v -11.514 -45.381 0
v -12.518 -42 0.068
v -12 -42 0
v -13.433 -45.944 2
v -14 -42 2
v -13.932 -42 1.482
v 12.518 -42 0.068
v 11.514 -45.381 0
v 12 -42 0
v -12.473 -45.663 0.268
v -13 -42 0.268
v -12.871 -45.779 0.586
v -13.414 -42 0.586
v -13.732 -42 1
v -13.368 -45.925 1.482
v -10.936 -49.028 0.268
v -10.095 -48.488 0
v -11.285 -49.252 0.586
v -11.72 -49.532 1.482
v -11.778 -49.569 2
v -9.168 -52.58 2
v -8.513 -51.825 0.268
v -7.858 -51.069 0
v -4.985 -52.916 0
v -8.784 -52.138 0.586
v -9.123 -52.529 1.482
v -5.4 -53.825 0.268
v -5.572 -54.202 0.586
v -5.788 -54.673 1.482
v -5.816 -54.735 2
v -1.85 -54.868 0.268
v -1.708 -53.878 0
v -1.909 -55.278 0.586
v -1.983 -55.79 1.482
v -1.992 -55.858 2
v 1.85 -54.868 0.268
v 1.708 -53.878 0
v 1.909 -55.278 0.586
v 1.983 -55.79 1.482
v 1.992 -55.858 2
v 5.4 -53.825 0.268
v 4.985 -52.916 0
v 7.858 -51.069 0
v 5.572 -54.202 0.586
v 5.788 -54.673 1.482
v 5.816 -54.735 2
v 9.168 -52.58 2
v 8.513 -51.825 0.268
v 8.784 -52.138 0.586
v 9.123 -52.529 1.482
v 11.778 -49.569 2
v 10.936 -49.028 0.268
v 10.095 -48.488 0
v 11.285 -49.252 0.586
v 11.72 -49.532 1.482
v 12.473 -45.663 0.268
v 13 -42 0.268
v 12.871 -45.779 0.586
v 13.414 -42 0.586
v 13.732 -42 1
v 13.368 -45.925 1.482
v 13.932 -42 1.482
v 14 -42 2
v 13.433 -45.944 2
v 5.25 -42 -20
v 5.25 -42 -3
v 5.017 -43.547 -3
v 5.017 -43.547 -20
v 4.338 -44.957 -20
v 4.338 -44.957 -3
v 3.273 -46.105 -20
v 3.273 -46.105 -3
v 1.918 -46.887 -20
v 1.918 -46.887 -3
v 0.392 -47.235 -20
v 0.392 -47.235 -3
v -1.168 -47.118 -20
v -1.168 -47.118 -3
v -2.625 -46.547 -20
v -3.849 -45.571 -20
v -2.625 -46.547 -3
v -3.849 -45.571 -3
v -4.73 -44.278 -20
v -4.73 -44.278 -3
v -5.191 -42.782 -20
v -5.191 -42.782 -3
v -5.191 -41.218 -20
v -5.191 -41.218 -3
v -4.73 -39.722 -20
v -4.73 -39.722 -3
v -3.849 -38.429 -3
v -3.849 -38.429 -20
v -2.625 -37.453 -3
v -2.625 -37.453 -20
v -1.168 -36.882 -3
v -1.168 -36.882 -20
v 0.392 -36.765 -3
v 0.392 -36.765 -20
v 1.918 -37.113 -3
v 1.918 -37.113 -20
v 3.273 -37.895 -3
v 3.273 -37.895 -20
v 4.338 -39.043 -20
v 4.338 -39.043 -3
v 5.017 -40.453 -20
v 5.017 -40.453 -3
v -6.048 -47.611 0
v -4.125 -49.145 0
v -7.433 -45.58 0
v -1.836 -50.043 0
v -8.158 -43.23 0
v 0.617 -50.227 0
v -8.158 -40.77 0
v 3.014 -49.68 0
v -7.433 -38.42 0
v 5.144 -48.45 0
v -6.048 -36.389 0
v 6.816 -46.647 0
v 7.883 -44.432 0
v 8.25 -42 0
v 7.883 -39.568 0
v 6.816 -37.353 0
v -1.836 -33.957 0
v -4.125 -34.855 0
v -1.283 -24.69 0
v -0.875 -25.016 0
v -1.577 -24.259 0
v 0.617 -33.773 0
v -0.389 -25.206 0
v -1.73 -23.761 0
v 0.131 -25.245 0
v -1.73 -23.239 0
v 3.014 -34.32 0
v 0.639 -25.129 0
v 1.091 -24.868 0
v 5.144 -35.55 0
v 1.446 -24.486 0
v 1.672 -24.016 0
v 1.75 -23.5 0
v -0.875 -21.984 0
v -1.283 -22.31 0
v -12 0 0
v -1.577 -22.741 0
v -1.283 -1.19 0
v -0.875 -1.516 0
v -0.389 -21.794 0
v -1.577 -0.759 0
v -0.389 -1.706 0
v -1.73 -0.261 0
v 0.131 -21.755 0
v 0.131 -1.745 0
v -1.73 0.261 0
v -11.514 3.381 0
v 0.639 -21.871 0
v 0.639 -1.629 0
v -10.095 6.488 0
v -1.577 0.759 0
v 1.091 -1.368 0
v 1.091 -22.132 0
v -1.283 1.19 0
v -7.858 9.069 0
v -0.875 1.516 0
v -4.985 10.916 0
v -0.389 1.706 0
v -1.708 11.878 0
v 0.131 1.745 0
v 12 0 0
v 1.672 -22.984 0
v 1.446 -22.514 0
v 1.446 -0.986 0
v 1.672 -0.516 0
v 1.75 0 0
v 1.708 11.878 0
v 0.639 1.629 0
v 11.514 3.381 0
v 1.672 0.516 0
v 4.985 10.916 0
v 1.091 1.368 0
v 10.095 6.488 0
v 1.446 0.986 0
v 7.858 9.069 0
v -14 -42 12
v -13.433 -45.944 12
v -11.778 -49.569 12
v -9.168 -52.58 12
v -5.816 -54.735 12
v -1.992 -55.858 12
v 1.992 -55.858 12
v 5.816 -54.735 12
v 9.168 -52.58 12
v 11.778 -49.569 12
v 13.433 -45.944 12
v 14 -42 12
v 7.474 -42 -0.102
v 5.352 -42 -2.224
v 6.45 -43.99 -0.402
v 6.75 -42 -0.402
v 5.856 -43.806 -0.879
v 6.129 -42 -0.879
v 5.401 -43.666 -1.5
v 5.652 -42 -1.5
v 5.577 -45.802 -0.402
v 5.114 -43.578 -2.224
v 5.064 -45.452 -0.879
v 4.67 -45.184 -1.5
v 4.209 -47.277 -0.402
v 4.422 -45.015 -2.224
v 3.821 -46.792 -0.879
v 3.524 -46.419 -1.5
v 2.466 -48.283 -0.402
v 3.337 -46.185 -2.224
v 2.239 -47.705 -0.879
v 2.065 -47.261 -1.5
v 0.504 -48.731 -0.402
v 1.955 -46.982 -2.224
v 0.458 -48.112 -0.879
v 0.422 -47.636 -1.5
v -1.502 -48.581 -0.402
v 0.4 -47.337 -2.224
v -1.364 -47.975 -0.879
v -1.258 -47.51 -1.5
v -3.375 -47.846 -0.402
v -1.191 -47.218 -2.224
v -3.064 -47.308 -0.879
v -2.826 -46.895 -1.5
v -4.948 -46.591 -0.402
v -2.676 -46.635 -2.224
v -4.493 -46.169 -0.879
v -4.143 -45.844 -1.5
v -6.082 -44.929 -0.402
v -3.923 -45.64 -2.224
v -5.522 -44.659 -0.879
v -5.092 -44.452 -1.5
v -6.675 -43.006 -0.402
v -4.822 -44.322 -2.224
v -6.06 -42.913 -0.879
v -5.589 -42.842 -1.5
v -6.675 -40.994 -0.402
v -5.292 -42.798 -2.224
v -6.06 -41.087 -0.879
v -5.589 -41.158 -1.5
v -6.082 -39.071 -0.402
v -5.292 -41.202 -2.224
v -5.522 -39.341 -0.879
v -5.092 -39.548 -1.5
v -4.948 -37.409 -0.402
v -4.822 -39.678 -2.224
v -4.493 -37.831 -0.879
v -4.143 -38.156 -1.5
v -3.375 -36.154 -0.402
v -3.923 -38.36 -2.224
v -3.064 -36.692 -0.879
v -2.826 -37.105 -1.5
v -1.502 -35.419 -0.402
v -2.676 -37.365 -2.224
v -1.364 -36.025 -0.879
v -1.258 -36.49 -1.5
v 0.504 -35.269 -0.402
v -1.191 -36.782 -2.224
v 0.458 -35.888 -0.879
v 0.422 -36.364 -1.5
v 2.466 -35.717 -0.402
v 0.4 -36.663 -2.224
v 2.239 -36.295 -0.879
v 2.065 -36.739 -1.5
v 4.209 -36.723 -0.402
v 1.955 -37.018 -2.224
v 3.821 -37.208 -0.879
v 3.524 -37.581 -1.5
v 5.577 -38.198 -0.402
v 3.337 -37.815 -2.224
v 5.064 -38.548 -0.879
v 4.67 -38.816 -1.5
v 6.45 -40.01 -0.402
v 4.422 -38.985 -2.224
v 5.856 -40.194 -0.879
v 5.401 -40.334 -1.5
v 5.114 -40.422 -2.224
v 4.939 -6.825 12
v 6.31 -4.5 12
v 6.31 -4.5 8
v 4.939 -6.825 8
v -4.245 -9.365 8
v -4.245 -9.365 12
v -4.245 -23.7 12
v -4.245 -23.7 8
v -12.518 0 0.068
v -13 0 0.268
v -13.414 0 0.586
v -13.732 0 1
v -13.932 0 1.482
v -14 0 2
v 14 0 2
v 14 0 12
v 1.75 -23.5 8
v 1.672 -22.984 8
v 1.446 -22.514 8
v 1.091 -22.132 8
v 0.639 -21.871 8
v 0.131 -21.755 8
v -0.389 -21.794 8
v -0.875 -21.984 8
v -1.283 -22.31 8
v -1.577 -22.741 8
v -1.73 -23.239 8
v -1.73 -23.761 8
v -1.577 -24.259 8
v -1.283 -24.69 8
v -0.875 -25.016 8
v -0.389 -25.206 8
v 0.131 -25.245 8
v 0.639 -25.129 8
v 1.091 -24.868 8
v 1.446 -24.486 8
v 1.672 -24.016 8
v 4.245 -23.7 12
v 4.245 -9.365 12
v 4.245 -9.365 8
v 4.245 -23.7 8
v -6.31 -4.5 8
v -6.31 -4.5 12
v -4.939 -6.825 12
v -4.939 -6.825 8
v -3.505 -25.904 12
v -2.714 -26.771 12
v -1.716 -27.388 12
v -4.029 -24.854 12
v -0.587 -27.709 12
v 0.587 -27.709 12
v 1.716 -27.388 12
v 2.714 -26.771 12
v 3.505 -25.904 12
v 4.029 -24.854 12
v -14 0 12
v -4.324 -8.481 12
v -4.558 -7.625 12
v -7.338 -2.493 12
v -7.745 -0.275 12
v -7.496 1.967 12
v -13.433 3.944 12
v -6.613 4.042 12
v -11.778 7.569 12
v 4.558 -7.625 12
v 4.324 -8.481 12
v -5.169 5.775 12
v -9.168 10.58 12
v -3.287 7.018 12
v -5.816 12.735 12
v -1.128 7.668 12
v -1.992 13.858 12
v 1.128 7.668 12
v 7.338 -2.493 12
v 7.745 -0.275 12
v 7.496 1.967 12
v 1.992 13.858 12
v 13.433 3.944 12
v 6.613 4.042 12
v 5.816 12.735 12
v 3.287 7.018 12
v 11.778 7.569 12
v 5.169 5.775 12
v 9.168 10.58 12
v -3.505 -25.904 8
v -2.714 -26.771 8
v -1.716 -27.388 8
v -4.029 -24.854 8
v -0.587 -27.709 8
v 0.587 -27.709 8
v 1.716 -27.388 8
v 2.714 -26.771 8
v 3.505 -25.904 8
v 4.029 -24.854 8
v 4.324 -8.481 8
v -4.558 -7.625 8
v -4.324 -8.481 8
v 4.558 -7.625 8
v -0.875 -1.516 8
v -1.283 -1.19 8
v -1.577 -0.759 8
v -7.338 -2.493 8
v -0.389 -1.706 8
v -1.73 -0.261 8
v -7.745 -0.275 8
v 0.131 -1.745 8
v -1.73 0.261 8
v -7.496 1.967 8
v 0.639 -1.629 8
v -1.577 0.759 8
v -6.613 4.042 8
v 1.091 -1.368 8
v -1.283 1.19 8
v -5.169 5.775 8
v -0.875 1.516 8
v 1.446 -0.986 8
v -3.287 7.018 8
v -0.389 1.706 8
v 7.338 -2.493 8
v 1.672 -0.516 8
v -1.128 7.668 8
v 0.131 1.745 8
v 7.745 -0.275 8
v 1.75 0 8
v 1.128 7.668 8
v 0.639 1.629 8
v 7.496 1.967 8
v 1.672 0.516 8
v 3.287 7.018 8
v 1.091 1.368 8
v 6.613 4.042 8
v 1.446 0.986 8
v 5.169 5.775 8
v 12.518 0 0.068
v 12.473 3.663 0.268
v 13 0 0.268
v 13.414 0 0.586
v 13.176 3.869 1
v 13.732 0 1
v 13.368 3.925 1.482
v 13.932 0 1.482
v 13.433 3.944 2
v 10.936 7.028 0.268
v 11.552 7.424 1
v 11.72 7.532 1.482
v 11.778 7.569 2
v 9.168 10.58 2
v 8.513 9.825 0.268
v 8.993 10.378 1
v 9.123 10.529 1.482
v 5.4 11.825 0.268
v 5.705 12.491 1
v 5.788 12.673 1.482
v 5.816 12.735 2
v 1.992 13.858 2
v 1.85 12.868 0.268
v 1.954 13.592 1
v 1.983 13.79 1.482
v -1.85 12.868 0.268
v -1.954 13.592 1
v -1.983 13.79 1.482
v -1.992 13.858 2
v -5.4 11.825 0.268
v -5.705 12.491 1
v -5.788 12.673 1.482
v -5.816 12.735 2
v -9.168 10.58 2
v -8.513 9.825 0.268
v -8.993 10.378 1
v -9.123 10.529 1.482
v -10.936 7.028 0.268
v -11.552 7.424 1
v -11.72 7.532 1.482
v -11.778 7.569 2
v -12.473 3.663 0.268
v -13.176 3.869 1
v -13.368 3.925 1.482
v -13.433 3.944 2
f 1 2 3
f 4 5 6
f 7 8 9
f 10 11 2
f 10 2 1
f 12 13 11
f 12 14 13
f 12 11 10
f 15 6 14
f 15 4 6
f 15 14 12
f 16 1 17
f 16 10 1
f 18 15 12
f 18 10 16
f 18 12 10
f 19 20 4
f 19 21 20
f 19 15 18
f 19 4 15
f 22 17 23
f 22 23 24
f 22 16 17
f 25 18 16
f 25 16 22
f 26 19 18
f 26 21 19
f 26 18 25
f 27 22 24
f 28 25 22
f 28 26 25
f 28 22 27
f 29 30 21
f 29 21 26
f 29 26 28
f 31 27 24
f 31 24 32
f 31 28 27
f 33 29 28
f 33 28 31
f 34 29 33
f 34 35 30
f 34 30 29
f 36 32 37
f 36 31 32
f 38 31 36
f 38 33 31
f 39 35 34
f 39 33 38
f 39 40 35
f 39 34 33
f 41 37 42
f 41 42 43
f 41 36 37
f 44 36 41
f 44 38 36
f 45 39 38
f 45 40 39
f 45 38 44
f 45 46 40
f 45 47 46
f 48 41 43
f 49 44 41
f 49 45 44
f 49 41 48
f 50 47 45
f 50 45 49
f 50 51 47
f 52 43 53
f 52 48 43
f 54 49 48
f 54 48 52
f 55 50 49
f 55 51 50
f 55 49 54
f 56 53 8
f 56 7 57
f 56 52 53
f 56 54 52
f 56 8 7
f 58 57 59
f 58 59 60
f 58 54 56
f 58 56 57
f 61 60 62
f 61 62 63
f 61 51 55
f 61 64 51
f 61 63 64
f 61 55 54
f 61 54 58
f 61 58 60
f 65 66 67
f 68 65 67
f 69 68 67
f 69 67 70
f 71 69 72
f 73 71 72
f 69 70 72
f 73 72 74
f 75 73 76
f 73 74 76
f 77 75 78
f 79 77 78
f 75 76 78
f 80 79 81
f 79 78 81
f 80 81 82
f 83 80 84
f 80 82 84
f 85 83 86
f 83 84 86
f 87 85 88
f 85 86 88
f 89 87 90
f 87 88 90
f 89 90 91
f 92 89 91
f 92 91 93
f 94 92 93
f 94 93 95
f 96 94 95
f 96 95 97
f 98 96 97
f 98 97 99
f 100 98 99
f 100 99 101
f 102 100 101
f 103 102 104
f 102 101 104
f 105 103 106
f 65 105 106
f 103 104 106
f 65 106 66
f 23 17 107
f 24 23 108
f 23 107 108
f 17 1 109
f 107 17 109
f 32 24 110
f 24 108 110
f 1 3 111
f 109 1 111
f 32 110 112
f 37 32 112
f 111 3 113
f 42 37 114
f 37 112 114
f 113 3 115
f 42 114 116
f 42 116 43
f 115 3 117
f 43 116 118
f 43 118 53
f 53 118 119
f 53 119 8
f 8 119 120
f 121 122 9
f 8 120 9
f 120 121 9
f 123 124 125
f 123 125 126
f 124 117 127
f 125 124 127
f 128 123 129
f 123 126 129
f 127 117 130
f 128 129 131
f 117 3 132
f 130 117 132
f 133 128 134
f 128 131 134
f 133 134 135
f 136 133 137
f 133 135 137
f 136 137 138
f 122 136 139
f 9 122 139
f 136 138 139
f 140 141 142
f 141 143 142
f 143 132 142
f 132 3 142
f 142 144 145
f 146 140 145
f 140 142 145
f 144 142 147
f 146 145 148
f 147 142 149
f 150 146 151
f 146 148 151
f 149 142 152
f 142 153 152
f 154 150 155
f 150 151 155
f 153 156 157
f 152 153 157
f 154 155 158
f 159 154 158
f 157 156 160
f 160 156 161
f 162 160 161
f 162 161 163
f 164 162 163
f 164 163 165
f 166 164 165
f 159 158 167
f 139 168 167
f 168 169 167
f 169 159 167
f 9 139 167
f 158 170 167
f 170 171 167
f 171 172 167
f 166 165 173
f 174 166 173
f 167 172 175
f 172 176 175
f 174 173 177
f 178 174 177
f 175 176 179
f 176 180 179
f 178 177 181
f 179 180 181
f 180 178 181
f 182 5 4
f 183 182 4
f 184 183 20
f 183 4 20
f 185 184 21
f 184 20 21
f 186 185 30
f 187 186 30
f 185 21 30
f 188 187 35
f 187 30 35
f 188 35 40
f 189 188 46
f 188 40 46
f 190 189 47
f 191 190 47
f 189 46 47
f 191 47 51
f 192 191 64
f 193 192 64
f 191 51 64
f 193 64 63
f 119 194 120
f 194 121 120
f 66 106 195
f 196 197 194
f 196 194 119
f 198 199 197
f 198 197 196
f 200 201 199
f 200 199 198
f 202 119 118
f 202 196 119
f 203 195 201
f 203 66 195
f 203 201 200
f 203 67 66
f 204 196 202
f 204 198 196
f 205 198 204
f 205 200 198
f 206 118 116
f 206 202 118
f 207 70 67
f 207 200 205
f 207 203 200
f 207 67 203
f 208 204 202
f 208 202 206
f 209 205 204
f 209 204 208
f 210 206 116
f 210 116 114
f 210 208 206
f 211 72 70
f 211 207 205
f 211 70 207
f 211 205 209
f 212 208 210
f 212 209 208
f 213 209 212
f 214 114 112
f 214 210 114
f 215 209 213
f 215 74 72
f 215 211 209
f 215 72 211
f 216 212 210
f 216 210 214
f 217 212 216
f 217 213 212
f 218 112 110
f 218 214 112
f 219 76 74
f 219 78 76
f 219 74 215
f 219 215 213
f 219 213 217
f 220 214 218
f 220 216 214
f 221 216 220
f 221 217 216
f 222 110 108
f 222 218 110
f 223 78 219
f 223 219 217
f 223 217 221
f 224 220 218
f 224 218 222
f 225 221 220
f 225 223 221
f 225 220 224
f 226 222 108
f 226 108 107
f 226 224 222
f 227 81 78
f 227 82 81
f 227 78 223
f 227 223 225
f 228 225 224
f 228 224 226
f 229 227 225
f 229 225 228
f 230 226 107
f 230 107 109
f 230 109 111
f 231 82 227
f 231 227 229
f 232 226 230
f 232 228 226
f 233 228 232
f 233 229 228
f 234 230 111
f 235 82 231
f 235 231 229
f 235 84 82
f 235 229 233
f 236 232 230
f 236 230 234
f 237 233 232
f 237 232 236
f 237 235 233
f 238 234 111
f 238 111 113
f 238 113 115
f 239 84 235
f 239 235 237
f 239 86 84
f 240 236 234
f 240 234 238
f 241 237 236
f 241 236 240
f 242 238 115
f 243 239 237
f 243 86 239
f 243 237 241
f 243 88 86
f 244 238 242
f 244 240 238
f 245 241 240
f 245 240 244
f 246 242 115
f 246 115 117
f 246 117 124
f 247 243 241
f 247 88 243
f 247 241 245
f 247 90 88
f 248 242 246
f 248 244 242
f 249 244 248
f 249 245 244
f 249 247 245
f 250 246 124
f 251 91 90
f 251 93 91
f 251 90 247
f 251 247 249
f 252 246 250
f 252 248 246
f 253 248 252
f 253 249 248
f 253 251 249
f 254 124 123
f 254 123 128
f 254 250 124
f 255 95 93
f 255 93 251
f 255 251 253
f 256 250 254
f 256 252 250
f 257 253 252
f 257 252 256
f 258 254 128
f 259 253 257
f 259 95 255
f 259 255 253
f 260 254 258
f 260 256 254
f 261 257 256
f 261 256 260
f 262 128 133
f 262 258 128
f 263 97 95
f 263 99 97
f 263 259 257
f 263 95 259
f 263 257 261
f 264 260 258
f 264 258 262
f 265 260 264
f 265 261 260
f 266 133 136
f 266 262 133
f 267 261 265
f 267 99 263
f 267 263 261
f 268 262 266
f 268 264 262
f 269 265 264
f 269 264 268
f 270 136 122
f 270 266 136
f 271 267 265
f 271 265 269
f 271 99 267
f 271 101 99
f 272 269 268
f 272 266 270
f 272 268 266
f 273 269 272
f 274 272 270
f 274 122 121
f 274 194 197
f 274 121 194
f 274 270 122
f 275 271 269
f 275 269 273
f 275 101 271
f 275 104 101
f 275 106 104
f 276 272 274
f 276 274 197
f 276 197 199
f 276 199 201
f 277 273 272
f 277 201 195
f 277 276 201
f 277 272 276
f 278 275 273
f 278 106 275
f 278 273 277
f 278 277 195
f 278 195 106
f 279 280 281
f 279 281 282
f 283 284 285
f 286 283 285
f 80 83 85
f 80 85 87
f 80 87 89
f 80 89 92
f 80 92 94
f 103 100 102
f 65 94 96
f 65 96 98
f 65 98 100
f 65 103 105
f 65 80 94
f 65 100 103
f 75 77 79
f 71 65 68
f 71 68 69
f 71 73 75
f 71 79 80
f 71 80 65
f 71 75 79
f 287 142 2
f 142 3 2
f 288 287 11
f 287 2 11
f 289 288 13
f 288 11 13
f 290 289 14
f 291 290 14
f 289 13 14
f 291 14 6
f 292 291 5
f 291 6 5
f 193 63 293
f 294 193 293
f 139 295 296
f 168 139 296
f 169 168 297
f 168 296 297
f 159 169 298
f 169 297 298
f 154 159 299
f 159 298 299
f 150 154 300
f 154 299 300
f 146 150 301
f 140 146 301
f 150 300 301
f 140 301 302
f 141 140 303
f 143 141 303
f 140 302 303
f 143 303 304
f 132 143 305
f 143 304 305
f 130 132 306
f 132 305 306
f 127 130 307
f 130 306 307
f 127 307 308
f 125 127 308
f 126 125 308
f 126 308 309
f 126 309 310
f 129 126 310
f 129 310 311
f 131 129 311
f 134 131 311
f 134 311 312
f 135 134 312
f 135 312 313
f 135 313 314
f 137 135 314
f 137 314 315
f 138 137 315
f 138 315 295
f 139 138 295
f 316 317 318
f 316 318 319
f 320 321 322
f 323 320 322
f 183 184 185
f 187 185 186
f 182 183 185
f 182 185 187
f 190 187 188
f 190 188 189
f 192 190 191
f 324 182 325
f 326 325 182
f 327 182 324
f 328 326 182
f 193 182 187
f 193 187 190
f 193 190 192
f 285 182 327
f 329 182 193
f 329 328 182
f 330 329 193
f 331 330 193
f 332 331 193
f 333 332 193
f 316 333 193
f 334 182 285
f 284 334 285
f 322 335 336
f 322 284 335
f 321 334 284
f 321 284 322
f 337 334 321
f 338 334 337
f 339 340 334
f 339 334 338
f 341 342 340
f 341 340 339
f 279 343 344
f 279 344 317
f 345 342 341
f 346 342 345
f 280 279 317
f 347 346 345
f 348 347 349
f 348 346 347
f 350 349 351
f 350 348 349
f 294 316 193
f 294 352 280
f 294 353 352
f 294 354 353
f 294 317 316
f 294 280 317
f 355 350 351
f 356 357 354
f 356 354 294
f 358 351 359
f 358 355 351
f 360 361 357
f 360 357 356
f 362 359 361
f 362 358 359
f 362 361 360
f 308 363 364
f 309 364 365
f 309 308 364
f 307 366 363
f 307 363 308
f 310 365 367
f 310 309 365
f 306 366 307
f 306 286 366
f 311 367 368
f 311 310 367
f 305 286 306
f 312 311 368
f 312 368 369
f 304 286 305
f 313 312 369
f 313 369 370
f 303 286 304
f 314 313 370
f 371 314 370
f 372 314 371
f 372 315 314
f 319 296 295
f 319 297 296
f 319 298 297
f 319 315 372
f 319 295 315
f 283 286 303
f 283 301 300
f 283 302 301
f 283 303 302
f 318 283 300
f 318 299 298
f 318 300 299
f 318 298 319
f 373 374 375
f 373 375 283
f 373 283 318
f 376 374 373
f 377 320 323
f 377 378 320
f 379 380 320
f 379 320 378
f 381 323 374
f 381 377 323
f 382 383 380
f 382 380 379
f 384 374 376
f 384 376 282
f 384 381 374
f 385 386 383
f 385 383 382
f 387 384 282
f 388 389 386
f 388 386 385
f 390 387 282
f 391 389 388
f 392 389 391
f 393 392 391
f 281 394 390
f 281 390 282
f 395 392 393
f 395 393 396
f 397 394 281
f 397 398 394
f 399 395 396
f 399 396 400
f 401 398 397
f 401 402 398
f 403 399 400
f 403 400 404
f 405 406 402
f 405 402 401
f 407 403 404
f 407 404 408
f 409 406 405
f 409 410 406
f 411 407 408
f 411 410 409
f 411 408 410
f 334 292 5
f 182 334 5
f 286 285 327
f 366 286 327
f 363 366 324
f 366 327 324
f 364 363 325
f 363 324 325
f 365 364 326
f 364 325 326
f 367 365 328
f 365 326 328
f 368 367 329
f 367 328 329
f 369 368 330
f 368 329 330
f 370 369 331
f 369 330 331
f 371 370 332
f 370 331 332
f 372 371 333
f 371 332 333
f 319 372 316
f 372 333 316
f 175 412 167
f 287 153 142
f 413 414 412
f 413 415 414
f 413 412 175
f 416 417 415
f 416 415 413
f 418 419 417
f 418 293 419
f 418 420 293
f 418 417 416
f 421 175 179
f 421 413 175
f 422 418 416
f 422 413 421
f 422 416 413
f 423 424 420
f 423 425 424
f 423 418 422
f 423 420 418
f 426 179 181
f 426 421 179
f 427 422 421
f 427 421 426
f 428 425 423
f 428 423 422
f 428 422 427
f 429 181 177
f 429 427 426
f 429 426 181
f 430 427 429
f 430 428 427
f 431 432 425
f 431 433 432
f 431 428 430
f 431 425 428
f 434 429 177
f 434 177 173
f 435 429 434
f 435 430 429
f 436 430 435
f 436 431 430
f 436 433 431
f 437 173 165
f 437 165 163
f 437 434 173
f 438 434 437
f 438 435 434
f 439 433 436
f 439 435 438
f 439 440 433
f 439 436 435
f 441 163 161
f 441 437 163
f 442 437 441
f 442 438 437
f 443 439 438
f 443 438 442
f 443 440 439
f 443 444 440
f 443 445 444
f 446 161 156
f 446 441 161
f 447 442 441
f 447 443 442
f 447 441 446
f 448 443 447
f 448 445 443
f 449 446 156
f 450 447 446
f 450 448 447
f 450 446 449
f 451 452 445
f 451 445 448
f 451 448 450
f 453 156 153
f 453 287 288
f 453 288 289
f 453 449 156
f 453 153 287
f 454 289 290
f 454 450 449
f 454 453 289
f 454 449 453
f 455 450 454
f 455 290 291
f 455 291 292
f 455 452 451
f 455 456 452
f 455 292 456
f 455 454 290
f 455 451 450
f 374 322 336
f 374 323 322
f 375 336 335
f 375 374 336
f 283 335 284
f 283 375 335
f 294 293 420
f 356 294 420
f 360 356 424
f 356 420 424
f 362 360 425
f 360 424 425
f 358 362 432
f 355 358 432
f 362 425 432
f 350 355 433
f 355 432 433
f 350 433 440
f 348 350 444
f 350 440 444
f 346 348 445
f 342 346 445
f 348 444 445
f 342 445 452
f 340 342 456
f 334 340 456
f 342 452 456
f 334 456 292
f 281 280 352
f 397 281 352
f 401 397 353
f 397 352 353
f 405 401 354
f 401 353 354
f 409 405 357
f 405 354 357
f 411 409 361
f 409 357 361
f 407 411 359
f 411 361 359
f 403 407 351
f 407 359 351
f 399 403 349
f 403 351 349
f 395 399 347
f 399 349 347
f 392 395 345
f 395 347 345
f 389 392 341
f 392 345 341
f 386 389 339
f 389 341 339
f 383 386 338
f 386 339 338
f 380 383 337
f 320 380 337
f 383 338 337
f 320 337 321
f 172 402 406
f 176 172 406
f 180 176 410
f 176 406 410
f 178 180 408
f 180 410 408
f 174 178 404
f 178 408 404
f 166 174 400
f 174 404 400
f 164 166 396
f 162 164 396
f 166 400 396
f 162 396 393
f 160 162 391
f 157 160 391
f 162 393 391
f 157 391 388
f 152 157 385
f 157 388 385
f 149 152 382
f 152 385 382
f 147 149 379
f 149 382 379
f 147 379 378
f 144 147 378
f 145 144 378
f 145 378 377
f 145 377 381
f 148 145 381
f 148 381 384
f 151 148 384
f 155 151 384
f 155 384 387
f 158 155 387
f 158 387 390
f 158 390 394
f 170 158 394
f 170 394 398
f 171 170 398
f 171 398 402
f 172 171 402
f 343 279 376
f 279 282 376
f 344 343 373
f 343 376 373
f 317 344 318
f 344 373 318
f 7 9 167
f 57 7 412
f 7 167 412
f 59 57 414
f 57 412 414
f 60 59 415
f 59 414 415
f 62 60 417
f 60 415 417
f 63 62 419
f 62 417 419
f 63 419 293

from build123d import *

# Parameters (mm, degrees)
PAD_DEPTH       = 12
POCKET_DEPTH    = 4
SKETCH002_R     = 5.25
PAD001_DEPTH    = 20
SKETCH003_R     = 1.75
POCKET001_DEPTH = 28.001
FILLET_R        = 3
FILLET001_R     = 2
FILLET002_R     = 5


with BuildPart() as part:
    # Sketch001 → Pad (new body)
    with BuildSketch(Plane.XY):
        with BuildLine():
            ThreePointArc((14, 0), (0, 14), (-14, 0))
            Line((-14, 0), (-14, -42))
            ThreePointArc((-14, -42), (0, -56), (14, -42))
            Line((14, -42), (14, 0))
        make_face()
    extrude(amount=PAD_DEPTH)

    # Sketch (on Face6 of Pad) → Pocket (cut)
    with BuildSketch(Plane.XY.offset(12)):
        with BuildLine():
            ThreePointArc((6.309715, -4.5), (0, 7.75), (-6.309715, -4.5))
            Line((-6.309715, -4.5), (-4.245292, -8))
            Line((-4.245292, -8), (-4.245292, -23.7))
            ThreePointArc((-4.245292, -23.7), (0, -27.75), (4.245292, -23.7))
            Line((4.245292, -8), (4.245292, -23.7))
            Line((6.309715, -4.5), (4.245292, -8))
        make_face()
    extrude(amount=-POCKET_DEPTH, mode=Mode.SUBTRACT)

    # Sketch002 (on Face4 of Pocket) → Pad001 (join)
    with BuildSketch(Plane(origin=(0, 0, 0), x_dir=(1, 0, 0), z_dir=(0, 0, -1))):
        with Locations((0, 42)):
            Circle(SKETCH002_R)
    extrude(amount=PAD001_DEPTH)

    # Sketch003 (on Face15 of Pad001) → Pocket001 (cut, through all)
    with BuildSketch(Plane.XY.offset(8)):
        Circle(SKETCH003_R)
        with Locations((0, -23.5)):
            Circle(SKETCH003_R)
    extrude(amount=-POCKET001_DEPTH, mode=Mode.SUBTRACT)

    # Fillet
    fillet_edges = [part.edges().sort_by_distance(p)[0] for p in [
        (-5.25, -42, 0),
    ]]
    fillet(fillet_edges, radius=FILLET_R)

    # Fillet001
    fillet001_edges = [part.edges().sort_by_distance(p)[0] for p in [
        (-14, -21, 0),
        (0, 14, 0),
        (14, -21, 0),
        (0, -56, 0),
    ]]
    fillet(fillet001_edges, radius=FILLET001_R)

    # Fillet002
    fillet002_edges = [part.edges().sort_by_distance(p)[0] for p in [
        (-4.245292, -8, 10),
        (4.245292, -8, 10),
    ]]
    fillet(fillet002_edges, radius=FILLET002_R)


solid = part.part
